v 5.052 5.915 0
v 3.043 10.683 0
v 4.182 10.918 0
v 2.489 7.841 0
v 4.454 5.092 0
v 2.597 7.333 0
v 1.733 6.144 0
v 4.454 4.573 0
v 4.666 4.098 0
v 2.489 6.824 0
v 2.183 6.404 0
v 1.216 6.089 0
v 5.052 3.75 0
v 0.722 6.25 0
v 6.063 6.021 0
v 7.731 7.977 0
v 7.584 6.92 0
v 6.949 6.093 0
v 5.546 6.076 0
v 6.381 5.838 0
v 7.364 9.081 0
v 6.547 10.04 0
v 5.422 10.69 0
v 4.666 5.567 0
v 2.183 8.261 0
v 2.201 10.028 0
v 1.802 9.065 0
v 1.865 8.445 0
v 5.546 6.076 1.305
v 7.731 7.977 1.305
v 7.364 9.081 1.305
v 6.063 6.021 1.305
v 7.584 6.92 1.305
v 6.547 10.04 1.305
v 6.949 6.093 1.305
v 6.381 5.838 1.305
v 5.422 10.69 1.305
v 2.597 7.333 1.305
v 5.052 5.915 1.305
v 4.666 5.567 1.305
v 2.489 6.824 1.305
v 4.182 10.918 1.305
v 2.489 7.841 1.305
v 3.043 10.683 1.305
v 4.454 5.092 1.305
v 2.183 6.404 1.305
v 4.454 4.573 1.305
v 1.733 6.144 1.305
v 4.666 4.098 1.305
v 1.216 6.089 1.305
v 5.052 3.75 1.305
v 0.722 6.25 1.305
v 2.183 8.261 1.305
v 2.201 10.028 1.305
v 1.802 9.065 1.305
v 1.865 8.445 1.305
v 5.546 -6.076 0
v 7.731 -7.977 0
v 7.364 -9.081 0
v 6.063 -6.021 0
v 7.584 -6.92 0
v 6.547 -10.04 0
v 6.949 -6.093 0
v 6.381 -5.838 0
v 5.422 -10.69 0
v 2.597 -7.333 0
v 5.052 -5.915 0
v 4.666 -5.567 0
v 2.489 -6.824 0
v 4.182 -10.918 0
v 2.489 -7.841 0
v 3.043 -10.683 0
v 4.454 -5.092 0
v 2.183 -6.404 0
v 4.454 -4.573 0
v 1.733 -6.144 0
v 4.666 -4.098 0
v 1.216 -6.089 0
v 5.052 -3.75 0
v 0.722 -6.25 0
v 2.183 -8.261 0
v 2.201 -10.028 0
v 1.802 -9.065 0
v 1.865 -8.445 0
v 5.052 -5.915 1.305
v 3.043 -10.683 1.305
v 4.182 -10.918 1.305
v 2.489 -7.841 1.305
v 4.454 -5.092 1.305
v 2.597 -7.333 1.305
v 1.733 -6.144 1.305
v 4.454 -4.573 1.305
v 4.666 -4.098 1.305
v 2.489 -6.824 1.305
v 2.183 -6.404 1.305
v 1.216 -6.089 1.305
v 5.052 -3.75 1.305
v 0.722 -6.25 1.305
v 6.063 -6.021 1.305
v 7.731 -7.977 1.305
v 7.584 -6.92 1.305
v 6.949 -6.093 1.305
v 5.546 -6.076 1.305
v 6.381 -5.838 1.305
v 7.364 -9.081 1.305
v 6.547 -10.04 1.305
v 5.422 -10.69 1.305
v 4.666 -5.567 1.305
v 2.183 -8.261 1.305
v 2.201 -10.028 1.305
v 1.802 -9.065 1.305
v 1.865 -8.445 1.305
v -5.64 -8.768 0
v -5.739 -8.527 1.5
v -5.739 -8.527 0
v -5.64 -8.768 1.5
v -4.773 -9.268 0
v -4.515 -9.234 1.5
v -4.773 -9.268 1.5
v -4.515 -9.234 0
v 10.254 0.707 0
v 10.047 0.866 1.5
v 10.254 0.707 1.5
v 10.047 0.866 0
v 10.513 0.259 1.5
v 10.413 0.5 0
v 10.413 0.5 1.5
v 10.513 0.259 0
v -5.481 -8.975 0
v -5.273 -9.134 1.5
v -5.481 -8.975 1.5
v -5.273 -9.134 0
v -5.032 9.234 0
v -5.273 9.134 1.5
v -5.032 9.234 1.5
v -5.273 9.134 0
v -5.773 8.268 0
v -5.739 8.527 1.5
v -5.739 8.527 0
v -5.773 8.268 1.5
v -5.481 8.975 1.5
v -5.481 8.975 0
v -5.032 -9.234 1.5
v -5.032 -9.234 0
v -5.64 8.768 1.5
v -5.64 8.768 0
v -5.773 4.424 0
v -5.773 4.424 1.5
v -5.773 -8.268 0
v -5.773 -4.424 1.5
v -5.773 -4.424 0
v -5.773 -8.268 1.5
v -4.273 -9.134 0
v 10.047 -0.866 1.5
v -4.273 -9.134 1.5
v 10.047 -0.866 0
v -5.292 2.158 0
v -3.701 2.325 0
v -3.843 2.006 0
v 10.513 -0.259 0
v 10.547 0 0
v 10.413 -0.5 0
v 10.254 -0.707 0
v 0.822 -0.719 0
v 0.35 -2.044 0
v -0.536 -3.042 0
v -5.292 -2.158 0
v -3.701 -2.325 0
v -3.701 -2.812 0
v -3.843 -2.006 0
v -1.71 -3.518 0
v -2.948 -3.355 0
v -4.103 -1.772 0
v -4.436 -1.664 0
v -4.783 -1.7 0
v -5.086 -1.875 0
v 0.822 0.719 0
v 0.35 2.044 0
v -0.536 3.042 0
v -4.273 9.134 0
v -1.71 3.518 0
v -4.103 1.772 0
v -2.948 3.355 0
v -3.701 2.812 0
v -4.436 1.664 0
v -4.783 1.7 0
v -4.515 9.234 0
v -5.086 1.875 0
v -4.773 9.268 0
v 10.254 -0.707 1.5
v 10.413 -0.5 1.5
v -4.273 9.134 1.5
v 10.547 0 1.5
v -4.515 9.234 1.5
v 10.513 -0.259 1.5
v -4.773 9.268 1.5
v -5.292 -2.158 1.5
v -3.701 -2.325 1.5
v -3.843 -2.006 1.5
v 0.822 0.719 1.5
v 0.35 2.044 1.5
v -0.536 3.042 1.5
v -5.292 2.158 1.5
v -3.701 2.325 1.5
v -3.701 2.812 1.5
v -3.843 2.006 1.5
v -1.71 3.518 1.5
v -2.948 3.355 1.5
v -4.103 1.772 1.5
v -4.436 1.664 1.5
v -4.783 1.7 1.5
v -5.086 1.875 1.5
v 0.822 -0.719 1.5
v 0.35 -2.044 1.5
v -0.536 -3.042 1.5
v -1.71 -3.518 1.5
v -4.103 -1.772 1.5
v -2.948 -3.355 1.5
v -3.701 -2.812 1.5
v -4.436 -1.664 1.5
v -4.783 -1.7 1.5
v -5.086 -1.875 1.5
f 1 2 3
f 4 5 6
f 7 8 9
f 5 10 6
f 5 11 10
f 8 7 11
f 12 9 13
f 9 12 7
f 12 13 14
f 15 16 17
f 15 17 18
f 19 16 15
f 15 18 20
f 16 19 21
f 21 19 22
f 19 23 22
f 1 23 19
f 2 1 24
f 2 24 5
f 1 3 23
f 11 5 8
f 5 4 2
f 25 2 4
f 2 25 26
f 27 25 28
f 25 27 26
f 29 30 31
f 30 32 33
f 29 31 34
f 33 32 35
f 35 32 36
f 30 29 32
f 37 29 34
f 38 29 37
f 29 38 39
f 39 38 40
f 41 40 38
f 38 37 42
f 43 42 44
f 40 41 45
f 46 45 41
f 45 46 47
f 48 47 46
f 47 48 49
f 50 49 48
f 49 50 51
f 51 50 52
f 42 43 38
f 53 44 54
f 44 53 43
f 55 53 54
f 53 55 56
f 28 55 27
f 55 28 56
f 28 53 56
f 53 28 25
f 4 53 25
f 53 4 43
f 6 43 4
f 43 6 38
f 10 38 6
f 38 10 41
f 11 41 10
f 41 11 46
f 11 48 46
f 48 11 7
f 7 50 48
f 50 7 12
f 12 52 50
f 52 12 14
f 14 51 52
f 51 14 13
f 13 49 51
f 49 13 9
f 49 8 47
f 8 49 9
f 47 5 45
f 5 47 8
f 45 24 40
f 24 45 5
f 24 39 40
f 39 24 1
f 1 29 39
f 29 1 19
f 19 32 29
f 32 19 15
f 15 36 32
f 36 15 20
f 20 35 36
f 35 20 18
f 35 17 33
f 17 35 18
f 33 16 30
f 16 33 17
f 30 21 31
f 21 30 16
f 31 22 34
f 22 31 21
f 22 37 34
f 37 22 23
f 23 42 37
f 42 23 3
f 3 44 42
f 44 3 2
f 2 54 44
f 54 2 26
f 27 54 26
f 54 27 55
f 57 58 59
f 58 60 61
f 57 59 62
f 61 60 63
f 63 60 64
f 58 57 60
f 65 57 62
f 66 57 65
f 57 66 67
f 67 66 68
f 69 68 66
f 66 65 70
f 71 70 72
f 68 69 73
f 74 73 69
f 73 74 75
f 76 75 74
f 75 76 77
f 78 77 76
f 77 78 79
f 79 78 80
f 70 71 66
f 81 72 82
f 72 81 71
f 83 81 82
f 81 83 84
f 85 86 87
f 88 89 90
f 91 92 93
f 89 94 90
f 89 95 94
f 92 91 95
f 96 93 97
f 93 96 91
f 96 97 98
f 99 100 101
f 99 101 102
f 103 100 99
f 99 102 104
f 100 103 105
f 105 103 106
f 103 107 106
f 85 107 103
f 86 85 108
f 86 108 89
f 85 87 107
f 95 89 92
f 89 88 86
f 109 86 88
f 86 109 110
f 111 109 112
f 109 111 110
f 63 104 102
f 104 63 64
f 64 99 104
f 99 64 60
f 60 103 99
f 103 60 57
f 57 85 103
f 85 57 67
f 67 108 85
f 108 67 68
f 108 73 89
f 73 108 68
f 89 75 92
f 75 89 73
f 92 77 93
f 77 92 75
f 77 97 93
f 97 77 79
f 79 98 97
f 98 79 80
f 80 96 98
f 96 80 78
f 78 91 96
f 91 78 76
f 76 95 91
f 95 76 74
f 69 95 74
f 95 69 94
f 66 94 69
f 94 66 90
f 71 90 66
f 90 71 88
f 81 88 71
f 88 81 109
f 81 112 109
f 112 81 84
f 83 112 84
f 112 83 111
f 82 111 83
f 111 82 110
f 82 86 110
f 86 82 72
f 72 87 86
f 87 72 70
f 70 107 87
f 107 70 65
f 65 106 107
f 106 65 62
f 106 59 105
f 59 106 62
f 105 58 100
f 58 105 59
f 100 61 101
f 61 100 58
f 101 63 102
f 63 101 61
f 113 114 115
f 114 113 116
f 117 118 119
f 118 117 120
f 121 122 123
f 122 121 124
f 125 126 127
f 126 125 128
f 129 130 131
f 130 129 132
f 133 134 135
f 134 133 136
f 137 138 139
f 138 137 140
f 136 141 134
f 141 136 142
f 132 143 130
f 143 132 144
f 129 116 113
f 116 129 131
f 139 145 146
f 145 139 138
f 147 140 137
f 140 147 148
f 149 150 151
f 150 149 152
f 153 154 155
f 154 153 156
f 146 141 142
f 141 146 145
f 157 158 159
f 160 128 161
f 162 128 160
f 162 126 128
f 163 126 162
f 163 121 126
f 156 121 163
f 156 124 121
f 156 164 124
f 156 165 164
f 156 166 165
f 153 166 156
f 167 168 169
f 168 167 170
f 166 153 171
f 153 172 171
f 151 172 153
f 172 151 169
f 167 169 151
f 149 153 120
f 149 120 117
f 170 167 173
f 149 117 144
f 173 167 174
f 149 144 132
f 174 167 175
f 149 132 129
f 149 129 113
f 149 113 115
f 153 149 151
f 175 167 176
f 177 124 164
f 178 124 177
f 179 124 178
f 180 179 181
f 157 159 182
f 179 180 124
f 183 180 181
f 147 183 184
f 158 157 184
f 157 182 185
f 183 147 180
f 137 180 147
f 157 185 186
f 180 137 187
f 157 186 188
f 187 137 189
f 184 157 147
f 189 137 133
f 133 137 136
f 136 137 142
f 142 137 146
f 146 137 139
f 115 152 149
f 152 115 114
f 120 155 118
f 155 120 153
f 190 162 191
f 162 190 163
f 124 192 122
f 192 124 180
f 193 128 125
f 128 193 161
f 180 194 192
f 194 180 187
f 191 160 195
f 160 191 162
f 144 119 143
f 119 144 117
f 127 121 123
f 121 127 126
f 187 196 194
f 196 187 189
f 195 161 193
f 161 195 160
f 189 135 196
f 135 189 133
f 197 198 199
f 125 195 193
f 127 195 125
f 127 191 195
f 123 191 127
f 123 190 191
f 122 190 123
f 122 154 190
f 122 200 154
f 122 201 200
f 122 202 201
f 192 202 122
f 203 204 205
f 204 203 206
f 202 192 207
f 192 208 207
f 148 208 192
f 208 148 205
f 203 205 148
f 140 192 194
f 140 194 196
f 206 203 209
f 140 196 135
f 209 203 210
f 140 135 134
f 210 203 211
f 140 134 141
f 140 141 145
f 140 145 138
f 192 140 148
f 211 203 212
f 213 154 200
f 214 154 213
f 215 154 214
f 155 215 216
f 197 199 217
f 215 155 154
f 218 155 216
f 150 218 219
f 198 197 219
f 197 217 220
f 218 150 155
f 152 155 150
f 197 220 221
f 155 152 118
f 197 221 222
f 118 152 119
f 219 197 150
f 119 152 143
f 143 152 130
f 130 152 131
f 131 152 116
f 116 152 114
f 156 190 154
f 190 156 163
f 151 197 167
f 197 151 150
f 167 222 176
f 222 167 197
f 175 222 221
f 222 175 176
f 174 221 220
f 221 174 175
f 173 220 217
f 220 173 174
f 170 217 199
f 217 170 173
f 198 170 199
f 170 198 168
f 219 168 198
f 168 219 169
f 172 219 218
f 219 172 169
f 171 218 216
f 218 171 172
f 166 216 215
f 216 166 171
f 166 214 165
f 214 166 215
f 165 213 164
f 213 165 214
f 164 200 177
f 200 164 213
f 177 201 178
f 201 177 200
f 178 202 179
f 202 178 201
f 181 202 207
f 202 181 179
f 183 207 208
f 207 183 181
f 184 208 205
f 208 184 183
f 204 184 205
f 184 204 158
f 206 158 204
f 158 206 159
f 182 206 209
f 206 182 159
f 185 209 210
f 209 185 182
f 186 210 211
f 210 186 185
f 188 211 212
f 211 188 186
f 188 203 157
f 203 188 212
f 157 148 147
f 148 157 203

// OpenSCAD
// file: shapes.scad
function polySide2R(side,n) = side/(2*sin(180/n));
function R2a(R,n) = R*cos(180/n);

module roundedPolygon(side, h,sides=4,r=1){
    H = r / cos(180/sides);
    linear_extrude(height=h)
    offset(r = r)
        circle(polySide2R(side,sides)-H,$fn=sides);
}

module regularPolygon(side,h, sides=4){
    cylinder(r=polySide2R(side,sides),h=h,$fn=sides);
}

//roundedPolygon(10,2,6,3);
//translate([0,0,2])regularPolygon(10,2,6);

module puzzleCon(s,$fn=15){
    h = 1;
    projection()
    difference(){
        union(){
        translate([-s*3/4,0,0]) scale([1,1.25,1]) cylinder(d=s,h=h);
        translate([-s/2,-s/2,0]) cube([s/2,s,h]);
        }
        translate([-s/4,-s/2,0]) cylinder(r=s/4,h=h);
        translate([-s/4,+s/2,0]) cylinder(r=s/4,h=h);
    }
}

module triangleCon(ConnectorSize){
    translate([-ConnectorSize/4,0,0]) circle(d=ConnectorSize,$fn=3);
}

module rectangleCon(ConnectorSize){
    h=1;
    projection()
    mirror([1,0,0]) union(){
                translate([0,-ConnectorSize/4,0]) 
                cube([ConnectorSize/2,ConnectorSize/2,h]);
                translate([ConnectorSize/2,-ConnectorSize/2,0])
                cube([ConnectorSize/2,ConnectorSize,h]);
            };
}
// main file
include <shapes.scad>

module tessellarConnect(d,ch,possitive,negative=[],t=0,zt=0,deltaAngle=0){
    sides=len(possitive);
    D=360/sides;
    zt = zt==0? t:zt;
    difference(){
        union(){
            children(0);
            for (a = [0:sides-1]) {
                if(possitive[a] == 1){
                    rotate([0,0,180+a*D+deltaAngle]) 
                        translate([-d/2,0,0]) 
                            linear_extrude(height=ch) children(1);
                }
            }
        }
        for (a = [0:sides-1]) {
                if((len(negative)==0 && possitive[a] ==0) 
                    || (len(negative)>0 && negative[a] == 1)){
                    rotate([0,0,a*D+deltaAngle]) 
                        translate([d/2,0,0]) 
                          linear_extrude(height=ch+zt) 
                            offset(delta=t) children(1);
                }
        }
    }
}

/*
 * Tile Parameters
 */
Positive=[1,0,1];
Negative=[0,1,0];
SideLength=20;
Height=1.5;
Roundness=1;

/*
 * Conenction
 */
ConnectionGeometry="puzzle"; //[triangle,puzzle,rectangle,loop]
ConnectionRatio=0.87;//(0,1]
ConnectionDelta=0; // only for "double" ConnectionType
ConnectionTolerance=0.4; // added clearence to negative part
ConnectionVTolerance=0.7; // Vertical clearence for bigger negative section
ConnectorSize=5;

NSides=len(Positive);

R=R2a(polySide2R(SideLength,NSides),NSides);

tessellarConnect(R*2,Height*ConnectionRatio,Positive,Negative,t=ConnectionTolerance,zt=ConnectionVTolerance,deltaAngle= 180/(NSides)){
    roundedPolygon(SideLength,Height,NSides,Roundness,$fn=24);
    
    if(ConnectionGeometry=="triangle"){
        triangleCon(ConnectorSize);
    }
    else if(ConnectionGeometry=="puzzle"){
        puzzleCon(ConnectorSize);
    }
    else if(ConnectionGeometry=="rectangle"){
        rectangleCon(ConnectorSize);
    }
}
